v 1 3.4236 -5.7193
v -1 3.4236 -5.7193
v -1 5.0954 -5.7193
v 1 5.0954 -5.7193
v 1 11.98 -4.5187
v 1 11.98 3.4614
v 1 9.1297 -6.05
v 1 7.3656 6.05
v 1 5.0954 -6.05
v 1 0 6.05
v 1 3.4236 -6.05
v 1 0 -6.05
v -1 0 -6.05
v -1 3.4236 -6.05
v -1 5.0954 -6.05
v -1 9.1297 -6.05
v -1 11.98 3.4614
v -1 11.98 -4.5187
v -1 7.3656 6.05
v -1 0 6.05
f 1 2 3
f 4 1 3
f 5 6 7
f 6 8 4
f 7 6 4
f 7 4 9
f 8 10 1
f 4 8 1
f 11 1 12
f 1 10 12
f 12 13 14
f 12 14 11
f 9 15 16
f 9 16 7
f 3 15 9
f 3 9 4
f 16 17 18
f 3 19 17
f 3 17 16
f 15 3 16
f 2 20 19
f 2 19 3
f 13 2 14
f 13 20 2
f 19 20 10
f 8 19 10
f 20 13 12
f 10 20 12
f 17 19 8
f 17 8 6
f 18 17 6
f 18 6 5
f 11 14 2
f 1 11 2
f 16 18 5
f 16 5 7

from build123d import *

# Parameters (mm, degrees)
SKETCH_1_W          = 2
SKETCH_1_H          = 12.1
EXTRUDE_1_DEPTH     = 13.2
SKETCH_2_W          = 0.330714911
SKETCH_2_H          = 1.671791026
CUT_EXTRUDE_1_DEPTH = 13.2


with BuildPart() as part:
    # 草图1 → 凸台-拉伸1 (new body)
    with BuildSketch(Plane(origin=(0, 0, 0), x_dir=(1, 0, 0), z_dir=(0, 1, 0))):
        Rectangle(SKETCH_1_W, SKETCH_1_H)
    extrude(amount=EXTRUDE_1_DEPTH)

    # 草图2 → 切除-拉伸1 (cut)
    with BuildSketch(Plane.ZY.offset(1)):
        with Locations((-5.884642545, 4.259492563)):
            Rectangle(SKETCH_2_W, SKETCH_2_H)
        Polygon((-4.518682009, 11.98), (-6.05, 9.129739953), (-6.05, 13.2), (6.05, 13.2), (6.05, 7.365579196), (3.461422835, 11.98), align=None)
    extrude(amount=-CUT_EXTRUDE_1_DEPTH, mode=Mode.SUBTRACT)


solid = part.part
